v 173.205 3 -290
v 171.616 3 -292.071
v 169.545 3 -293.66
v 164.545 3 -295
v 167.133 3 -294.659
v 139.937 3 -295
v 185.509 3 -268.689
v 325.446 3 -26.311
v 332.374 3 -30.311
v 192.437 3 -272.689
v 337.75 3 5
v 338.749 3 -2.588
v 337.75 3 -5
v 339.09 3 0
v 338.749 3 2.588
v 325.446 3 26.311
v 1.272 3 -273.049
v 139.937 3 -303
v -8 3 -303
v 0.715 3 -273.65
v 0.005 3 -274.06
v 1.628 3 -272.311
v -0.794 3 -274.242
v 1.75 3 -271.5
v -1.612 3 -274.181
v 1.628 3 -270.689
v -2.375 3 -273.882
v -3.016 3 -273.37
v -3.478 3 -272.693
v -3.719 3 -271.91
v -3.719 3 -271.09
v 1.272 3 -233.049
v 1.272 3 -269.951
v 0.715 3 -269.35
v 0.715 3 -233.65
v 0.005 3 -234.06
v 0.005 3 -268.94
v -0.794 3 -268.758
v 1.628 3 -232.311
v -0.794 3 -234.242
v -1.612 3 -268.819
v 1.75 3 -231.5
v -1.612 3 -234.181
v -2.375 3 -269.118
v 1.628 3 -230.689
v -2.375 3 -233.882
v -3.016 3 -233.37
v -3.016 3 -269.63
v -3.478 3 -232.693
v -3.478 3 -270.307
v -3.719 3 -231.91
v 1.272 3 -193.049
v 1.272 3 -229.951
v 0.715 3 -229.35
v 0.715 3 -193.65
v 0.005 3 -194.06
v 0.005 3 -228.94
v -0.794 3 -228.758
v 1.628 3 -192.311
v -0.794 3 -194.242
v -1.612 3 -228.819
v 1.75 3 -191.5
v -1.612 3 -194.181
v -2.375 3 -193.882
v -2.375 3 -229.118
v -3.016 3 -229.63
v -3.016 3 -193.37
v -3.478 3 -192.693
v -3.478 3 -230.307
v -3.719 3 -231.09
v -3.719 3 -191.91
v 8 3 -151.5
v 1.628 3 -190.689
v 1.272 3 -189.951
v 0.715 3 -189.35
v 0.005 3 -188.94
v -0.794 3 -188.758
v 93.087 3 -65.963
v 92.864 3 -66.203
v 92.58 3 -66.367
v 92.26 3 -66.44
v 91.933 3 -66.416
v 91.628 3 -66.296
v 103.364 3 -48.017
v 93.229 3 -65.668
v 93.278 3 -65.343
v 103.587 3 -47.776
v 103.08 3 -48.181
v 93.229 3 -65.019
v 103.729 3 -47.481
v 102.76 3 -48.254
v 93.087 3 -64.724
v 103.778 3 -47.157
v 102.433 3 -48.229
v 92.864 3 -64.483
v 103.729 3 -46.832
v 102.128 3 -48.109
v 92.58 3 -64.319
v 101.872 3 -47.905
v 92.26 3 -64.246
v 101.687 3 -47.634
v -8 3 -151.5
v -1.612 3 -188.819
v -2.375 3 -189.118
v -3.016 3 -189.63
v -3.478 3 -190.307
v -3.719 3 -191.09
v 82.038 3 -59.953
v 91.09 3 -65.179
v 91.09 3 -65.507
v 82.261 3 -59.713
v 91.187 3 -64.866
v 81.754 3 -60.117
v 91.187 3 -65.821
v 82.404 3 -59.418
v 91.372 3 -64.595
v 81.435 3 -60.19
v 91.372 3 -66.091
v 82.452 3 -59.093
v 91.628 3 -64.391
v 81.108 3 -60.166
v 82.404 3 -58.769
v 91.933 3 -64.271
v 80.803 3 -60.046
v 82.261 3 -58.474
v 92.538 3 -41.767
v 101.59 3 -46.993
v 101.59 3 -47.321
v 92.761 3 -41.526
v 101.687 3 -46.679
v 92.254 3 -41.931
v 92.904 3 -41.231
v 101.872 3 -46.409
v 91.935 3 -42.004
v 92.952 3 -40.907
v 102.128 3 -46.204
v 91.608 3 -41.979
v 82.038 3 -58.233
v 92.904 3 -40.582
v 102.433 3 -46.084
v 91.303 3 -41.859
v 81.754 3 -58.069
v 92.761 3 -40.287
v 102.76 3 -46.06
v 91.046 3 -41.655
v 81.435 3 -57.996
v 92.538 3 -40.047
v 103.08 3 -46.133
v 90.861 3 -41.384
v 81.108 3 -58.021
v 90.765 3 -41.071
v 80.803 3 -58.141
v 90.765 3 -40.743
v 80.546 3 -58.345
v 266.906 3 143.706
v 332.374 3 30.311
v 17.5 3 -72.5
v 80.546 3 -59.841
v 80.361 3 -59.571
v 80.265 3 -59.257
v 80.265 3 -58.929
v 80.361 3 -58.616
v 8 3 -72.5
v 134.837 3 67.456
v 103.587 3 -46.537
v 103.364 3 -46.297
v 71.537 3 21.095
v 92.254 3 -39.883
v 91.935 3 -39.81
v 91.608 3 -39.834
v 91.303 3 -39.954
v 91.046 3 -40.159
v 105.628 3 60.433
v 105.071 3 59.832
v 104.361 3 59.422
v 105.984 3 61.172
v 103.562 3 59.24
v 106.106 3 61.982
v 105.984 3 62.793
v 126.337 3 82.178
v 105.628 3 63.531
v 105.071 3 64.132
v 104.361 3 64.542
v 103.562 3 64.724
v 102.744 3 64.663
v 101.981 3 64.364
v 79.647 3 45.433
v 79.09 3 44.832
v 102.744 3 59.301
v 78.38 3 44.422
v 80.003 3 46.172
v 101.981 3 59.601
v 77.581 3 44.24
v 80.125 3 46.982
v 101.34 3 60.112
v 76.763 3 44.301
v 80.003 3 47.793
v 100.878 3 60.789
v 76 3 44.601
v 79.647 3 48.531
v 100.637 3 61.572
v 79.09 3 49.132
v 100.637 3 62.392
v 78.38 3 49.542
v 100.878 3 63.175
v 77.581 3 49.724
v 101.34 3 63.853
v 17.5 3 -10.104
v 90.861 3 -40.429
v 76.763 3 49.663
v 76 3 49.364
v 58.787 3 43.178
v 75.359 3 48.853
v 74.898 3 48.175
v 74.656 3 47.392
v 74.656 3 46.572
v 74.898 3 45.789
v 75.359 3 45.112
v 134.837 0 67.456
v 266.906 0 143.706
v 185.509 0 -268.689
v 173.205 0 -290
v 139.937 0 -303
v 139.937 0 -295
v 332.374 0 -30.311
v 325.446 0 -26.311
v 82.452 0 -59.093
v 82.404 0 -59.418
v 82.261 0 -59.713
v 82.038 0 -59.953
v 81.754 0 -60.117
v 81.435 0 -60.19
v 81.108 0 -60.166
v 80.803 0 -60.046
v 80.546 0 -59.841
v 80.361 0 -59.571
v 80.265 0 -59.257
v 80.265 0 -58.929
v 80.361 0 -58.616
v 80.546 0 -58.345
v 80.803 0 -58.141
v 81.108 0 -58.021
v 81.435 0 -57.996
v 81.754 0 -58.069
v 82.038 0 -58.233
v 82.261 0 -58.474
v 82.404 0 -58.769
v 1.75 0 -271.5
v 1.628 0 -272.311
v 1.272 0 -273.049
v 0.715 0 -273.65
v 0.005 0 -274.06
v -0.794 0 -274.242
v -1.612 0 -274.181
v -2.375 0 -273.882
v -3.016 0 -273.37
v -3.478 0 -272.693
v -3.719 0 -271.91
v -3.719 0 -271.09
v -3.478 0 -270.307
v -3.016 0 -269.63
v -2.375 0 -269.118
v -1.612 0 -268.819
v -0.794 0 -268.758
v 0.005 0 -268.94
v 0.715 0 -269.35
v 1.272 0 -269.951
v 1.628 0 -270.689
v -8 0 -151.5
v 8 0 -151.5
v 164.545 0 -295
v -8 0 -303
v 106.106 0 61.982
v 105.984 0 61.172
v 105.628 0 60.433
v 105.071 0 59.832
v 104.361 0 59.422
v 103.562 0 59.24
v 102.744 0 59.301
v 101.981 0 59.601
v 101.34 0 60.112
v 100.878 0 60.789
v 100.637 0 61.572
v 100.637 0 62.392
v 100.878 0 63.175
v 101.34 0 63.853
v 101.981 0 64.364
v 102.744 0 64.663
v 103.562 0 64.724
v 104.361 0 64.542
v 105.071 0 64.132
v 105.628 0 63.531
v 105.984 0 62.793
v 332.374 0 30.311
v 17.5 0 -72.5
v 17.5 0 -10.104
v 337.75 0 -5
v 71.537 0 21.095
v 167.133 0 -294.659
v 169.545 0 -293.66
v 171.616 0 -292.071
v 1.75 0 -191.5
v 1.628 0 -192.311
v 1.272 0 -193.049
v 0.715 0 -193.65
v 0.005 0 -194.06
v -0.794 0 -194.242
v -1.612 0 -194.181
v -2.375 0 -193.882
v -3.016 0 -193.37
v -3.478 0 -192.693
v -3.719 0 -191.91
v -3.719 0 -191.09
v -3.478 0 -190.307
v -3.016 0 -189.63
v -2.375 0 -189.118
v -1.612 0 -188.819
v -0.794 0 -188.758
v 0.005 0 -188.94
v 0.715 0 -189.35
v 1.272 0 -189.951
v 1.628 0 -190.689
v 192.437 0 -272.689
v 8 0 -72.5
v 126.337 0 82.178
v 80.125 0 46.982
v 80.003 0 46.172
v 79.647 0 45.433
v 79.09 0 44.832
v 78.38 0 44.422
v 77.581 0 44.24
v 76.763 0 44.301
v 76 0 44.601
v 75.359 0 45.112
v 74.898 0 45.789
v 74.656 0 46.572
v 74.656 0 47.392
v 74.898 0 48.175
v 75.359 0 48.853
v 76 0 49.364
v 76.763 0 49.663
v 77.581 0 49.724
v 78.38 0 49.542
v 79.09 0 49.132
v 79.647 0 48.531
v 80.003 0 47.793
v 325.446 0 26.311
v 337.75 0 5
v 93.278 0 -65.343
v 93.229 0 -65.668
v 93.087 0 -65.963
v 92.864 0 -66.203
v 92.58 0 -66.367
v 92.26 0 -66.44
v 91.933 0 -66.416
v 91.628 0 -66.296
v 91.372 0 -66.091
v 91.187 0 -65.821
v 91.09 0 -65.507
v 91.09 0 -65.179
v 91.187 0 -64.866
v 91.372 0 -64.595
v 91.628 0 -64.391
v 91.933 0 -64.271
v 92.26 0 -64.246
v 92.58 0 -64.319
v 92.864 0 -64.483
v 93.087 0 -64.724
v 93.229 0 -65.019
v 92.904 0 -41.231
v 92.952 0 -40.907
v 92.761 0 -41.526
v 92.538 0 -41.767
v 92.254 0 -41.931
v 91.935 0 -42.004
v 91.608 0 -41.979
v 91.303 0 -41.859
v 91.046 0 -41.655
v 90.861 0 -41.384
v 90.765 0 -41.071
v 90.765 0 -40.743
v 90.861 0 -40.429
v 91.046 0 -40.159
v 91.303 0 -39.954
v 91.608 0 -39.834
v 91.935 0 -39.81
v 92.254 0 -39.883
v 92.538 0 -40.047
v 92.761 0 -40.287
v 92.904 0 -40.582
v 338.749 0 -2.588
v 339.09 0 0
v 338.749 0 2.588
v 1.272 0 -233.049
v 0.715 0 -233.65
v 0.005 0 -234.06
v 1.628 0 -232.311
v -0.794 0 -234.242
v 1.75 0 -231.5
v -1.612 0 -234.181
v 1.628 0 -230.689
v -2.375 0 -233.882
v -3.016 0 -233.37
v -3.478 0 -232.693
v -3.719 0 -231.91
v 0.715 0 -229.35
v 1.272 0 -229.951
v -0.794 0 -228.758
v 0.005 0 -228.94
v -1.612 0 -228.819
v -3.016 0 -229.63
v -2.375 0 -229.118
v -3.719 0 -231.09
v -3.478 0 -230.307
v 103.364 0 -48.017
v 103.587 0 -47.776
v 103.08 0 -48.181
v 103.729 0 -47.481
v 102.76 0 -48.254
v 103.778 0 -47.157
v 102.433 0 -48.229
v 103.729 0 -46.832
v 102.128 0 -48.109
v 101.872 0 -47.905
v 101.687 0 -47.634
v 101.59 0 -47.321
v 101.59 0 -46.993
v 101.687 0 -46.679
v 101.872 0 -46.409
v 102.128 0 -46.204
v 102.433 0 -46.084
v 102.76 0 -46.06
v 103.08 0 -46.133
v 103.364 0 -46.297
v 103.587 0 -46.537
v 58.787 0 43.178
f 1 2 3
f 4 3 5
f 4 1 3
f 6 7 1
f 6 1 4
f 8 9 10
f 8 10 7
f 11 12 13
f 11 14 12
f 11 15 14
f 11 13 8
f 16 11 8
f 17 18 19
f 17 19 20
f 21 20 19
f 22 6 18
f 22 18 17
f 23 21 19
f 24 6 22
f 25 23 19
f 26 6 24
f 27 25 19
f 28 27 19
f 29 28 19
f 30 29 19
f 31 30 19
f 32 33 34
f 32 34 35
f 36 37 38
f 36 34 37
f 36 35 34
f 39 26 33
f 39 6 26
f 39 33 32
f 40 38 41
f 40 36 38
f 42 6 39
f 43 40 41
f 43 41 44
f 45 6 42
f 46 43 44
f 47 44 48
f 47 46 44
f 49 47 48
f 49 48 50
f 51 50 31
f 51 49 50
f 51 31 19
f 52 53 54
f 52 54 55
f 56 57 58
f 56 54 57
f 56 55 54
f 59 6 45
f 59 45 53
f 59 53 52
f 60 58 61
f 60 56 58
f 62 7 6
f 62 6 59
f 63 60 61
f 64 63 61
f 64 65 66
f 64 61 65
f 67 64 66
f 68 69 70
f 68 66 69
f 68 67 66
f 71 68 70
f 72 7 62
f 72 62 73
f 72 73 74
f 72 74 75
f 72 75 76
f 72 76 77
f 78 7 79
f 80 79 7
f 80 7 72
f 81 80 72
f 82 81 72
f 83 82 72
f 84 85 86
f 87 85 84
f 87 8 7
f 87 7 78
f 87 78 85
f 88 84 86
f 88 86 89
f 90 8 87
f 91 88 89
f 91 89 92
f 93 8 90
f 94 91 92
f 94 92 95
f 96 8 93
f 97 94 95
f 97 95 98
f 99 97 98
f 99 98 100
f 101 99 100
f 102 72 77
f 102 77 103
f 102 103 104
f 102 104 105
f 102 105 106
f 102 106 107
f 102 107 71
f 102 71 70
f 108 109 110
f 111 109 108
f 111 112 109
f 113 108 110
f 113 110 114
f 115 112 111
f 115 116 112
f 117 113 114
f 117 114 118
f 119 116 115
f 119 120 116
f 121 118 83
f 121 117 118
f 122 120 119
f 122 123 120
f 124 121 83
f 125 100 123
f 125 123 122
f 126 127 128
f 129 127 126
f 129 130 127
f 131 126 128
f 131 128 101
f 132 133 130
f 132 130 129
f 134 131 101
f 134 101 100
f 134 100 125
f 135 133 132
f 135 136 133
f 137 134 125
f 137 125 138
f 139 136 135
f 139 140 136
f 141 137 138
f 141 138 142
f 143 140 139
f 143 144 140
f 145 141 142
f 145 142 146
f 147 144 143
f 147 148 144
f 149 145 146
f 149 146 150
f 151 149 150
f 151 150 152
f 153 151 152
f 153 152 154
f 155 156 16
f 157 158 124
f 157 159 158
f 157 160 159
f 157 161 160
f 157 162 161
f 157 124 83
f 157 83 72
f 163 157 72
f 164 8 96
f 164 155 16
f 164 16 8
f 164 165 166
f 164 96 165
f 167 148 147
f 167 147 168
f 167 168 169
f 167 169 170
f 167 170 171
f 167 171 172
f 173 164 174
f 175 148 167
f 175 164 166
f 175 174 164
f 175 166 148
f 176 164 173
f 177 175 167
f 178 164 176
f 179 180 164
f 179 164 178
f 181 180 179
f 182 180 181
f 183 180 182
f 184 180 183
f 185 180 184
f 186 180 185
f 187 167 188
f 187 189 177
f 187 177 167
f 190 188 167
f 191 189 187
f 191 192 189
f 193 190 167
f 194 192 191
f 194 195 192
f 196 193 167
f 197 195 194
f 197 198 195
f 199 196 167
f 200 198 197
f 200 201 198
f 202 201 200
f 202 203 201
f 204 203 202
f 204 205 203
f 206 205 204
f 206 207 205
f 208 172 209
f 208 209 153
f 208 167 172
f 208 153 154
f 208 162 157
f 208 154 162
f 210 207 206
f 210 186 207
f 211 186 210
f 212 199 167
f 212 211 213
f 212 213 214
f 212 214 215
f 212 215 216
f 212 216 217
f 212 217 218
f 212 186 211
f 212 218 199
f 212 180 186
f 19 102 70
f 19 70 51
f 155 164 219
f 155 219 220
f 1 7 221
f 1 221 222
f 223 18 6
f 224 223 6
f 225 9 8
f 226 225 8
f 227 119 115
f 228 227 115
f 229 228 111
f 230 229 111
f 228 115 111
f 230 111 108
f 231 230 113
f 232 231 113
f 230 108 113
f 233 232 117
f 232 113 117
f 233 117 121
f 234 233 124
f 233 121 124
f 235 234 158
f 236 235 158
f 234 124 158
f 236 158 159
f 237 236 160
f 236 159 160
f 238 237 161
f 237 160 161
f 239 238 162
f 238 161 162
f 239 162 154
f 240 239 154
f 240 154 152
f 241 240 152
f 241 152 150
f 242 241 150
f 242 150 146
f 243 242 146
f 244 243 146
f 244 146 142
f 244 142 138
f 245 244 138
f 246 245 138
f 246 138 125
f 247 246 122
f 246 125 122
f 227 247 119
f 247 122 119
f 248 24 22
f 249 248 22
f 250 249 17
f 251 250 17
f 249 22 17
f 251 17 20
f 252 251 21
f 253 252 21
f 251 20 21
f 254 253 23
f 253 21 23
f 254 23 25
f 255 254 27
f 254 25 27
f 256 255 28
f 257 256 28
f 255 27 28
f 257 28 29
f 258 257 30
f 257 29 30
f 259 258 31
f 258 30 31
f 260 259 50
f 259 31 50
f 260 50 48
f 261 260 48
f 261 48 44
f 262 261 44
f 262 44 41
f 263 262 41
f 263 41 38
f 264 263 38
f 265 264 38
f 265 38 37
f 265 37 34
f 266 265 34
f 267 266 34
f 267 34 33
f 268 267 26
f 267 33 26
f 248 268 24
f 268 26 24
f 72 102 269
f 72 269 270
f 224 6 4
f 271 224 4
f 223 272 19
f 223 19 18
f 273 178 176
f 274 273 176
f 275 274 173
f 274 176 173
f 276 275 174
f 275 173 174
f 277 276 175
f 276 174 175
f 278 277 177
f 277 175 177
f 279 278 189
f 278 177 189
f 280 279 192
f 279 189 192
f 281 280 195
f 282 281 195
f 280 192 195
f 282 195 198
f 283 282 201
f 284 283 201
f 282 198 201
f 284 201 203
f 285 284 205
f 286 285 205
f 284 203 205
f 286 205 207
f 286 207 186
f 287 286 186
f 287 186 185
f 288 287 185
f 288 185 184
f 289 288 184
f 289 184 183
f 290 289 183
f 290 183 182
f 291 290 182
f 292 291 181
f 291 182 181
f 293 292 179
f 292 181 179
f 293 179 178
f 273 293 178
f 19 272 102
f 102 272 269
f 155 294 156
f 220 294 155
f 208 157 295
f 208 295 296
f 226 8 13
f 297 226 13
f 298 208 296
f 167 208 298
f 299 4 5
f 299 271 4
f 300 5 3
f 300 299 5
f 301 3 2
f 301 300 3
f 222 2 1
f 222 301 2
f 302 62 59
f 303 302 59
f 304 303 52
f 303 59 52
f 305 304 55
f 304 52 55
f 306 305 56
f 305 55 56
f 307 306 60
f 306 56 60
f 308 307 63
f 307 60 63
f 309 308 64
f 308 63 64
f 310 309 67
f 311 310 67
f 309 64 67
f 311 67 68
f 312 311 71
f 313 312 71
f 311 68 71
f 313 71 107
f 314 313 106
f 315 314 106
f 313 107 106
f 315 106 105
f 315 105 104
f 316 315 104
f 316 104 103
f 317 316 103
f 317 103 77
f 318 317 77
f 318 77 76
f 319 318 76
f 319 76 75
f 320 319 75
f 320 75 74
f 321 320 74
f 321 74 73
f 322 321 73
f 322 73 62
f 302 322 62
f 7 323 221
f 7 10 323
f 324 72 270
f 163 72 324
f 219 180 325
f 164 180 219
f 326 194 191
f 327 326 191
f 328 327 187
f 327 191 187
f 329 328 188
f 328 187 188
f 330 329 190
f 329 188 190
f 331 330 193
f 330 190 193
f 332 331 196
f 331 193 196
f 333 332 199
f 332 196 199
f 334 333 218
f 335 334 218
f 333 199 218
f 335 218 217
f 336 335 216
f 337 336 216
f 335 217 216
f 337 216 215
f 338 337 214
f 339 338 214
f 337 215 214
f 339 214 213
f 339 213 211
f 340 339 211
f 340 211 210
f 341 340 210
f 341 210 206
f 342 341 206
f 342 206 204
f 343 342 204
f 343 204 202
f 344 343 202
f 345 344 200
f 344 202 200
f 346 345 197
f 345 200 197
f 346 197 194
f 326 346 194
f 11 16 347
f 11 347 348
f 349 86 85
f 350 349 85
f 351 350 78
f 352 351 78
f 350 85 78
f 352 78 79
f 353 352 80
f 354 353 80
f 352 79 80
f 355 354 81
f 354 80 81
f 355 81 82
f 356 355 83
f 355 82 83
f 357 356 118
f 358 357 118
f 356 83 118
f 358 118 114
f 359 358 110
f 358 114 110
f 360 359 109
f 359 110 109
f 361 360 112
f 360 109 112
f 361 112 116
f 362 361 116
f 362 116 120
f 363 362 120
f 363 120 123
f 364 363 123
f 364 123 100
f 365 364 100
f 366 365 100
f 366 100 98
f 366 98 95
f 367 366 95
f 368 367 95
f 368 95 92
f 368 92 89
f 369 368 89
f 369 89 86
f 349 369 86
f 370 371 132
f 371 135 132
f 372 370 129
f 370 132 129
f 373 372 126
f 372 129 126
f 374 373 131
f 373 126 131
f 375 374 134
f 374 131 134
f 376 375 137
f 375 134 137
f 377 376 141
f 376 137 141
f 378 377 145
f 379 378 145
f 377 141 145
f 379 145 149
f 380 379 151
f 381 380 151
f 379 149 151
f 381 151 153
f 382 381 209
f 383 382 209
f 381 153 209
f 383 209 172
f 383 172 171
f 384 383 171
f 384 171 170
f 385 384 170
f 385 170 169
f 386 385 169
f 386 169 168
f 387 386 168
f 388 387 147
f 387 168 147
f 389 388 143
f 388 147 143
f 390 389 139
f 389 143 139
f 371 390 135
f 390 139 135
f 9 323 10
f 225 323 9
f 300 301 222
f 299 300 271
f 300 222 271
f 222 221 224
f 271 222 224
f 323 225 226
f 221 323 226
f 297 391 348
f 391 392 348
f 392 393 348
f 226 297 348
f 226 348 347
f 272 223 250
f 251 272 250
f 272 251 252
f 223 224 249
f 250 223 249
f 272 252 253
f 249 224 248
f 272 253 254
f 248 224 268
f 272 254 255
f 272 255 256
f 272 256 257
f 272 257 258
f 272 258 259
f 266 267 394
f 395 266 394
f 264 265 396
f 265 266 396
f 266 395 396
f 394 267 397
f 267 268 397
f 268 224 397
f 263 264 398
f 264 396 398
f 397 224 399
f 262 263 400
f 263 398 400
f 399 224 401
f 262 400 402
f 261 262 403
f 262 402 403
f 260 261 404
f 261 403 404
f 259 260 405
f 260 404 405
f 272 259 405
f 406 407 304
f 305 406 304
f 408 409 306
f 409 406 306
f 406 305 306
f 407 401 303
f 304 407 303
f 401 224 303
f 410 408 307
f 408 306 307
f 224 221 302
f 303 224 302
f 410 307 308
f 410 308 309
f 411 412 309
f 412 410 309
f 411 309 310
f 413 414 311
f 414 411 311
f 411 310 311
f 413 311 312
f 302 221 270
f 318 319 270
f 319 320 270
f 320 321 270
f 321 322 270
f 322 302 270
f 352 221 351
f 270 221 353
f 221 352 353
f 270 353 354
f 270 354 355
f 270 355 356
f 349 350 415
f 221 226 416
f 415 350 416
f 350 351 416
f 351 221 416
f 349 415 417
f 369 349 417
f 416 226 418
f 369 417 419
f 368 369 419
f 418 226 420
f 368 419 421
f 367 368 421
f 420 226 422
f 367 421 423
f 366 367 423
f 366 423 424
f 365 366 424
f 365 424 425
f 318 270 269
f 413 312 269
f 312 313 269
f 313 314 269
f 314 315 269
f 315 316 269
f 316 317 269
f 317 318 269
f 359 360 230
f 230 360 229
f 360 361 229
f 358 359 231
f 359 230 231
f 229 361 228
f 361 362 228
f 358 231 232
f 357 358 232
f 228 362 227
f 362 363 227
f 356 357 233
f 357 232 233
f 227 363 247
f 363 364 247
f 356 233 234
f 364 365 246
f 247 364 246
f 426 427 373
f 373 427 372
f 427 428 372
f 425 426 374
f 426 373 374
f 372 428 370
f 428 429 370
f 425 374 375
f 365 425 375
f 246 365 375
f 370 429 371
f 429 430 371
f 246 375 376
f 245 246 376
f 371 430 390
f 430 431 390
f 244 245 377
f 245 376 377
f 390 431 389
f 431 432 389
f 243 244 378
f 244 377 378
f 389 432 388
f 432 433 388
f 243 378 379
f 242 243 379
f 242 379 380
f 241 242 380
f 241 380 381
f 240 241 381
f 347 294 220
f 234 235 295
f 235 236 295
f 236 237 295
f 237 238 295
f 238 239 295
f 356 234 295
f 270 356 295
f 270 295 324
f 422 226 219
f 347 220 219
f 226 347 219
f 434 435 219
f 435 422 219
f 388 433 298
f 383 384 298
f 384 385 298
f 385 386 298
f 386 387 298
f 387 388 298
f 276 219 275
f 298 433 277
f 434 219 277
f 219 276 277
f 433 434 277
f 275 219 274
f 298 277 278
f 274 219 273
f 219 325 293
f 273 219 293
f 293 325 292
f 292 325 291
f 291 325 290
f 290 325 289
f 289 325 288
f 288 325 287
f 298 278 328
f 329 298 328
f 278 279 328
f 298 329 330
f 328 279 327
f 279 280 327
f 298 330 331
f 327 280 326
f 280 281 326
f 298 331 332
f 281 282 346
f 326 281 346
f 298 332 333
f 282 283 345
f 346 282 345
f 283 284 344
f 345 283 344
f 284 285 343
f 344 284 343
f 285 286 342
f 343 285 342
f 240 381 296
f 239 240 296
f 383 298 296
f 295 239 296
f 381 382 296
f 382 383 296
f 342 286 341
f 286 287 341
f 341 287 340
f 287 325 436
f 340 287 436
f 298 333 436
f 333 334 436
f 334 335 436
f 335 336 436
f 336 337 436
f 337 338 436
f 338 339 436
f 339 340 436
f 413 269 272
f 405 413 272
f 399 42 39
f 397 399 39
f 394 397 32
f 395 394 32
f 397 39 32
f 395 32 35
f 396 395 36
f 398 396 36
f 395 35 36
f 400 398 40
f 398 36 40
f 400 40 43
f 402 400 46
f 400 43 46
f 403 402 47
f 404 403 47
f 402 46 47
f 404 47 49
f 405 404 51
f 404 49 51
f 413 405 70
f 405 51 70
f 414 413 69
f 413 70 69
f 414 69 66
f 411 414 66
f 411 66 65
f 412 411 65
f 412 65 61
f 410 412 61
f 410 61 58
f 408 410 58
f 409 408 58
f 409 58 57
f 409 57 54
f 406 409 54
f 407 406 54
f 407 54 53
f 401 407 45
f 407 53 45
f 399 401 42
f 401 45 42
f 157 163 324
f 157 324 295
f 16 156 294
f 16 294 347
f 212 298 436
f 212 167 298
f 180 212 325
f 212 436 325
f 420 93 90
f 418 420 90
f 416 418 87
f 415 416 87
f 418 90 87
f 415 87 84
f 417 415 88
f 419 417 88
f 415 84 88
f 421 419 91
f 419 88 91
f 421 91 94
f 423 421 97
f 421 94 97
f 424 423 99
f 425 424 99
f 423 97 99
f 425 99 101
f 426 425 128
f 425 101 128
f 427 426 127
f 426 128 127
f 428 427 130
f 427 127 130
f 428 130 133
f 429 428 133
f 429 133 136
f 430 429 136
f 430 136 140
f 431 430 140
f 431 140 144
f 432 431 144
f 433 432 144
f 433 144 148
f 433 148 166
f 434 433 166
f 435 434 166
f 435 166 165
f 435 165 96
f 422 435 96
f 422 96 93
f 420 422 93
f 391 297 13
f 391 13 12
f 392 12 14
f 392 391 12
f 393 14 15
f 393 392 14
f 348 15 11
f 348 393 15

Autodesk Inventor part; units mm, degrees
ref_plane "YZ Plane" through (0, 0, 0) normal (1, 0, 0) x (0, 1, 0)
ref_plane "XZ Plane" through (0, 0, 0) normal (0, 1, 0) x (-1, 0, 0)
ref_plane "XY Plane" through (0, 0, 0) normal (0, 0, 1) x (1, 0, 0)
sketch "Sketch1" plane through (0, 0, 0) normal (0, 1, 0) x (-1, 0, 0)
  line L0 (349.8743, 0) -> (258.4057, -158.4282)
  line L1 (174.9371, -303) -> (-174.9371, -303)
  line L2 (-174.9371, -303) -> (-349.8743, 0)
  line L3 (-349.8743, 0) -> (-174.9371, 303)
  line L4 (-174.9371, 303) -> (174.9371, 303)
  line L5 (258.4057, 158.4282) -> (349.8743, 0)
  line L6 (0, 0) -> (-8, 0)
  line L7 (-8, 0) -> (-8, -303)
  line L8 (-8, -303) -> (8, -303)
  line L9 (8, -303) -> (8, 0)
  line L10 (8, 0) -> (-8, 0)
  circle A0 centre (0, 0) radius 2.5
  line L11 (258.4057, 158.4282) -> (-4, 6.9282)
  line L12 (4, -6.9282) -> (266.4057, 144.5718)
  line L13 (-4, 6.9282) -> (4, -6.9282)
  line L14 (-266.4057, 144.5718) -> (-4, -6.9282)
  line L15 (4, 6.9282) -> (-258.4057, 158.4282)
  line L16 (-4, -6.9282) -> (4, 6.9282)
  line L17 (8, -4.6188) -> (8, -151.5)
  line L18 (8, -151.5) -> (-8, -151.5)
  line L19 (-8, -151.5) -> (-8, -303)
  line L20 (-8, -4.6188) -> (-4, -6.9282)
  line L21 (4, -6.9282) -> (-4, -6.9282)
  line L22 (-266.4057, 144.5718) -> (-258.4057, 158.4282)
  line L23 (-127.2028, 82.6782) -> (-135.2028, 68.8218)
  line L24 (-135.2028, 68.8218) -> (-8, -4.6188)
  line L25 (-266.4057, 144.5718) -> (-349.8743, 0)
  line L26 (-174.9371, -303) -> (-349.8743, 0)
  line L27 (-174.9371, -303) -> (-8, -303)
  line L28 (0, 9.2376) -> (8, 0)
  dimension "d0" = 303
  dimension "d1" = 303
  dimension "d2" = 8
  dimension "d3" = 16
  dimension "d4" = 5
  dimension "d7" = 360
extrude "Extrusion1" add sketch "Sketch1" along normal blind 3 contours L1 L7 L18 L9 | L1 L2 L3 L14 L7 | L18 L7 L14 L21 L12 L9 | L12 L13 A0 L10 L9 | L14 L23 L15 L11 L13 A0 L6 L7 | L7 L6 A0 L16 L14 | L10 A0 L16 L28 | L21 L16 A0 L13 | L3 L15 L23 L14 | A0 L13 L10 | L10 L16 A0 | L28 L15 L16 | L16 A0 L13 L11 L28 | A0 L16 L13 | A0 L13 L6 | L6 L16 A0 | L13 A0 L16
sketch "Sketch2" plane through (0, 3, 0) normal (0, 1, 0) x (1, 0, 0)
  line L0 (-8, 303) -> (-8, 0) projected
  line L1 (-8, 0) -> (-8, 151.5)
  line L2 (-8, 151.5) -> (8, 151.5)
  line L3 (8, 151.5) -> (8, 0)
  line L4 (8, 0) -> (-8, 0)
  line L5 (0, -9.2376) -> (258.4057, -158.4282) projected
  line L6 (258.4057, -158.4282) -> (126.3368, -82.1782)
  line L7 (126.3368, -82.1782) -> (134.8368, -67.4558)
  line L8 (134.8368, -67.4558) -> (266.9057, -143.7058)
  line L9 (266.9057, -143.7058) -> (258.4057, -158.4282)
  point P0 (0, 0)
  dimension "d11" = 151.5
  dimension "d12" = 16
  dimension "d13" = 152.5
  dimension "d14" = 17
extrude "Extrusion2" cut sketch "Sketch2" against normal blind 3
sketch "Sketch3" plane through (0, 3, 0) normal (0, 1, 0) x (1, 0, 0)
  line L0 (174.9371, 303) -> (-8, 303) projected
  line L1 (174.9371, 303) -> (139.9371, 303)
  line L2 (139.9371, 303) -> (139.9371, 295)
  line L3 (139.9371, 295) -> (174.9371, 295)
  line L4 (174.9371, 295) -> (174.9371, 303)
  line L5 (349.8743, 0) -> (174.9371, 303) projected
  line L6 (174.9371, 303) -> (192.4371, 272.6891)
  line L7 (192.4371, 272.6891) -> (185.5089, 268.6891)
  line L8 (185.5089, 268.6891) -> (168.0089, 299)
  line L9 (168.0089, 299) -> (174.9371, 303)
  line L10 (349.8743, 0) -> (332.3743, 30.3109)
  line L11 (332.3743, 30.3109) -> (325.4461, 26.3109)
  line L12 (325.4461, 26.3109) -> (342.9461, -4)
  line L13 (342.9461, -4) -> (349.8743, 0)
  line L14 (349.8743, 0) -> (332.3743, -30.3109)
  line L15 (332.3743, -30.3109) -> (325.4461, -26.3109)
  line L16 (325.4461, -26.3109) -> (342.9461, 4)
  line L17 (342.9461, 4) -> (349.8743, 0)
  line L18 (349.8743, 0) -> (266.9057, -143.7058) projected
  line L19 (349.8743, 0) -> (384.8743, 0) construction
  point P0 (0, 0)
  dimension "d17" = 35
  dimension "d18" = 8
  dimension "d19" = 35
  dimension "d20" = 8
  dimension "d21" = 35
  dimension "d22" = 8
  dimension "d23" = 35
  dimension "d24" = 120
  dimension "d25" = 8
extrude "Extrusion3" cut sketch "Sketch3" against normal blind 3
sketch "Sketch4" plane through (0, 3, 0) normal (0, 1, 0) x (1, 0, 0)
  line L0 (-54.0368, 51.4054) -> (71.5368, -21.0946)
  line L1 (71.5368, -21.0946) -> (54.0368, -51.4054)
  line L2 (54.0368, -51.4054) -> (-71.5368, 21.0946)
  line L3 (-71.5368, 21.0946) -> (-54.0368, 51.4054)
  line L4 (-54.0368, 51.4054) -> (54.0368, -51.4054) construction
  line L5 (71.5368, -21.0946) -> (-71.5368, 21.0946) construction
  line L6 (-54.0368, 51.4054) -> (90.9632, 51.4054) construction
  line L7 (-17.5, -72.5) -> (-17.5, 72.5)
  line L8 (-17.5, 72.5) -> (17.5, 72.5)
  line L9 (17.5, 72.5) -> (17.5, -72.5)
  line L10 (17.5, -72.5) -> (-17.5, -72.5)
  line L11 (-17.5, -72.5) -> (17.5, 72.5) construction
  line L12 (-17.5, 72.5) -> (17.5, -72.5) construction
  line L13 (-8, 0) -> (8, 0) projected
  line L14 (-17.5, -72.5) -> (127.5, -72.5) construction
  point P0 (0, 0)
  dimension "d28" = 145
  dimension "d29" = 30
  dimension "d30" = 35
  dimension "d31" = 145
  dimension "d32" = 90
  dimension "d33" = 35
extrude "Extrusion4" cut sketch "Sketch4" against normal blind 3
sketch "Sketch5" plane through (0, 3, 0) normal (0, 1, 0) x (1, 0, 0)
  line L0 (-1, 151.5) -> (-1, 191.5)
  circle A0 centre (-1, 191.5) radius 2.75
  circle A1 centre (-1, 231.5) radius 2.75
  circle A2 centre (-1, 271.5) radius 2.75
  circle A3 centre (0, 0) radius 0.5
  line L1 (126.3368, -82.1782) -> (134.8368, -67.4558) projected
  line L2 (126.3368, -82.1782) -> (129.3368, -76.9821)
  line L3 (129.3368, -76.9821) -> (103.3561, -61.9821)
  line L4 (103.3561, -61.9821) -> (77.3753, -46.9821)
  circle A4 centre (103.3561, -61.9821) radius 2.75
  circle A5 centre (77.3753, -46.9821) radius 2.75
  line L5 (-8, 303) -> (-8, 151.5) projected
  dimension "d36" = 40
  dimension "d37" = 5.5
  dimension "d40" = 40
  dimension "d45" = 1
  dimension "d46" = 6
  dimension "d47" = 30
  dimension "d48" = 30
  dimension "d49" = 5.5
  dimension "d50" = 5.5
  dimension "d53" = 7
extrude "Extrusion5" cut sketch "Sketch5" against normal blind 3 contours A0 | A1 | A2 | A4 L4 L3 | A5 | L3 L4 A4
sketch "Sketch6" plane through (0, 3, 0) normal (0, 1, 0) x (1, 0, 0)
  line L0 (-8, 303) -> (-8, 151.5) projected
  line L1 (-8, 303) -> (344, 303)
  line L2 (344, 303) -> (344, -147)
  line L3 (344, -147) -> (-8, -147)
  line L4 (-8, -147) -> (-8, 303)
  point P0 (0, 0)
  dimension "d54" = 352
  dimension "d55" = 450
sketch "Sketch7" plane through (0, 3, 0) normal (0, 1, 0) x (1, 0, 0)
  line L0 (0, 0) -> (86.6025, 50)
  line L1 (0, 0) -> (100, 0) construction
  line L2 (86.6025, 50) -> (91.8525, 40.9067)
  circle A0 centre (91.8525, 40.9067) radius 1.1
  line L3 (86.6025, 50) -> (89.2006, 51.5)
  line L4 (86.6025, 50) -> (89.6025, 50) construction
  circle A1 centre (81.3525, 59.0933) radius 1.1
  circle A2 centre (102.6779, 47.1567) radius 1.1
  circle A3 centre (92.1779, 65.3433) radius 1.1
  dimension "d56" = 100
  dimension "d57" = 30
  dimension "d58" = 10.5
  dimension "d59" = 90
  dimension "d60" = 2.2
  dimension "d61" = 3
  dimension "d62" = 30
  dimension "d65" = 21
  dimension "d68" = 12.5
extrude "Extrusion6" cut sketch "Sketch7" against normal blind 5
fillet "Fillet1" radius 10 2 edges at (340.6367, 1.5, 0) (170.3183, 1.5, -295)
properties part number "Acrylic_bottom_camera"
